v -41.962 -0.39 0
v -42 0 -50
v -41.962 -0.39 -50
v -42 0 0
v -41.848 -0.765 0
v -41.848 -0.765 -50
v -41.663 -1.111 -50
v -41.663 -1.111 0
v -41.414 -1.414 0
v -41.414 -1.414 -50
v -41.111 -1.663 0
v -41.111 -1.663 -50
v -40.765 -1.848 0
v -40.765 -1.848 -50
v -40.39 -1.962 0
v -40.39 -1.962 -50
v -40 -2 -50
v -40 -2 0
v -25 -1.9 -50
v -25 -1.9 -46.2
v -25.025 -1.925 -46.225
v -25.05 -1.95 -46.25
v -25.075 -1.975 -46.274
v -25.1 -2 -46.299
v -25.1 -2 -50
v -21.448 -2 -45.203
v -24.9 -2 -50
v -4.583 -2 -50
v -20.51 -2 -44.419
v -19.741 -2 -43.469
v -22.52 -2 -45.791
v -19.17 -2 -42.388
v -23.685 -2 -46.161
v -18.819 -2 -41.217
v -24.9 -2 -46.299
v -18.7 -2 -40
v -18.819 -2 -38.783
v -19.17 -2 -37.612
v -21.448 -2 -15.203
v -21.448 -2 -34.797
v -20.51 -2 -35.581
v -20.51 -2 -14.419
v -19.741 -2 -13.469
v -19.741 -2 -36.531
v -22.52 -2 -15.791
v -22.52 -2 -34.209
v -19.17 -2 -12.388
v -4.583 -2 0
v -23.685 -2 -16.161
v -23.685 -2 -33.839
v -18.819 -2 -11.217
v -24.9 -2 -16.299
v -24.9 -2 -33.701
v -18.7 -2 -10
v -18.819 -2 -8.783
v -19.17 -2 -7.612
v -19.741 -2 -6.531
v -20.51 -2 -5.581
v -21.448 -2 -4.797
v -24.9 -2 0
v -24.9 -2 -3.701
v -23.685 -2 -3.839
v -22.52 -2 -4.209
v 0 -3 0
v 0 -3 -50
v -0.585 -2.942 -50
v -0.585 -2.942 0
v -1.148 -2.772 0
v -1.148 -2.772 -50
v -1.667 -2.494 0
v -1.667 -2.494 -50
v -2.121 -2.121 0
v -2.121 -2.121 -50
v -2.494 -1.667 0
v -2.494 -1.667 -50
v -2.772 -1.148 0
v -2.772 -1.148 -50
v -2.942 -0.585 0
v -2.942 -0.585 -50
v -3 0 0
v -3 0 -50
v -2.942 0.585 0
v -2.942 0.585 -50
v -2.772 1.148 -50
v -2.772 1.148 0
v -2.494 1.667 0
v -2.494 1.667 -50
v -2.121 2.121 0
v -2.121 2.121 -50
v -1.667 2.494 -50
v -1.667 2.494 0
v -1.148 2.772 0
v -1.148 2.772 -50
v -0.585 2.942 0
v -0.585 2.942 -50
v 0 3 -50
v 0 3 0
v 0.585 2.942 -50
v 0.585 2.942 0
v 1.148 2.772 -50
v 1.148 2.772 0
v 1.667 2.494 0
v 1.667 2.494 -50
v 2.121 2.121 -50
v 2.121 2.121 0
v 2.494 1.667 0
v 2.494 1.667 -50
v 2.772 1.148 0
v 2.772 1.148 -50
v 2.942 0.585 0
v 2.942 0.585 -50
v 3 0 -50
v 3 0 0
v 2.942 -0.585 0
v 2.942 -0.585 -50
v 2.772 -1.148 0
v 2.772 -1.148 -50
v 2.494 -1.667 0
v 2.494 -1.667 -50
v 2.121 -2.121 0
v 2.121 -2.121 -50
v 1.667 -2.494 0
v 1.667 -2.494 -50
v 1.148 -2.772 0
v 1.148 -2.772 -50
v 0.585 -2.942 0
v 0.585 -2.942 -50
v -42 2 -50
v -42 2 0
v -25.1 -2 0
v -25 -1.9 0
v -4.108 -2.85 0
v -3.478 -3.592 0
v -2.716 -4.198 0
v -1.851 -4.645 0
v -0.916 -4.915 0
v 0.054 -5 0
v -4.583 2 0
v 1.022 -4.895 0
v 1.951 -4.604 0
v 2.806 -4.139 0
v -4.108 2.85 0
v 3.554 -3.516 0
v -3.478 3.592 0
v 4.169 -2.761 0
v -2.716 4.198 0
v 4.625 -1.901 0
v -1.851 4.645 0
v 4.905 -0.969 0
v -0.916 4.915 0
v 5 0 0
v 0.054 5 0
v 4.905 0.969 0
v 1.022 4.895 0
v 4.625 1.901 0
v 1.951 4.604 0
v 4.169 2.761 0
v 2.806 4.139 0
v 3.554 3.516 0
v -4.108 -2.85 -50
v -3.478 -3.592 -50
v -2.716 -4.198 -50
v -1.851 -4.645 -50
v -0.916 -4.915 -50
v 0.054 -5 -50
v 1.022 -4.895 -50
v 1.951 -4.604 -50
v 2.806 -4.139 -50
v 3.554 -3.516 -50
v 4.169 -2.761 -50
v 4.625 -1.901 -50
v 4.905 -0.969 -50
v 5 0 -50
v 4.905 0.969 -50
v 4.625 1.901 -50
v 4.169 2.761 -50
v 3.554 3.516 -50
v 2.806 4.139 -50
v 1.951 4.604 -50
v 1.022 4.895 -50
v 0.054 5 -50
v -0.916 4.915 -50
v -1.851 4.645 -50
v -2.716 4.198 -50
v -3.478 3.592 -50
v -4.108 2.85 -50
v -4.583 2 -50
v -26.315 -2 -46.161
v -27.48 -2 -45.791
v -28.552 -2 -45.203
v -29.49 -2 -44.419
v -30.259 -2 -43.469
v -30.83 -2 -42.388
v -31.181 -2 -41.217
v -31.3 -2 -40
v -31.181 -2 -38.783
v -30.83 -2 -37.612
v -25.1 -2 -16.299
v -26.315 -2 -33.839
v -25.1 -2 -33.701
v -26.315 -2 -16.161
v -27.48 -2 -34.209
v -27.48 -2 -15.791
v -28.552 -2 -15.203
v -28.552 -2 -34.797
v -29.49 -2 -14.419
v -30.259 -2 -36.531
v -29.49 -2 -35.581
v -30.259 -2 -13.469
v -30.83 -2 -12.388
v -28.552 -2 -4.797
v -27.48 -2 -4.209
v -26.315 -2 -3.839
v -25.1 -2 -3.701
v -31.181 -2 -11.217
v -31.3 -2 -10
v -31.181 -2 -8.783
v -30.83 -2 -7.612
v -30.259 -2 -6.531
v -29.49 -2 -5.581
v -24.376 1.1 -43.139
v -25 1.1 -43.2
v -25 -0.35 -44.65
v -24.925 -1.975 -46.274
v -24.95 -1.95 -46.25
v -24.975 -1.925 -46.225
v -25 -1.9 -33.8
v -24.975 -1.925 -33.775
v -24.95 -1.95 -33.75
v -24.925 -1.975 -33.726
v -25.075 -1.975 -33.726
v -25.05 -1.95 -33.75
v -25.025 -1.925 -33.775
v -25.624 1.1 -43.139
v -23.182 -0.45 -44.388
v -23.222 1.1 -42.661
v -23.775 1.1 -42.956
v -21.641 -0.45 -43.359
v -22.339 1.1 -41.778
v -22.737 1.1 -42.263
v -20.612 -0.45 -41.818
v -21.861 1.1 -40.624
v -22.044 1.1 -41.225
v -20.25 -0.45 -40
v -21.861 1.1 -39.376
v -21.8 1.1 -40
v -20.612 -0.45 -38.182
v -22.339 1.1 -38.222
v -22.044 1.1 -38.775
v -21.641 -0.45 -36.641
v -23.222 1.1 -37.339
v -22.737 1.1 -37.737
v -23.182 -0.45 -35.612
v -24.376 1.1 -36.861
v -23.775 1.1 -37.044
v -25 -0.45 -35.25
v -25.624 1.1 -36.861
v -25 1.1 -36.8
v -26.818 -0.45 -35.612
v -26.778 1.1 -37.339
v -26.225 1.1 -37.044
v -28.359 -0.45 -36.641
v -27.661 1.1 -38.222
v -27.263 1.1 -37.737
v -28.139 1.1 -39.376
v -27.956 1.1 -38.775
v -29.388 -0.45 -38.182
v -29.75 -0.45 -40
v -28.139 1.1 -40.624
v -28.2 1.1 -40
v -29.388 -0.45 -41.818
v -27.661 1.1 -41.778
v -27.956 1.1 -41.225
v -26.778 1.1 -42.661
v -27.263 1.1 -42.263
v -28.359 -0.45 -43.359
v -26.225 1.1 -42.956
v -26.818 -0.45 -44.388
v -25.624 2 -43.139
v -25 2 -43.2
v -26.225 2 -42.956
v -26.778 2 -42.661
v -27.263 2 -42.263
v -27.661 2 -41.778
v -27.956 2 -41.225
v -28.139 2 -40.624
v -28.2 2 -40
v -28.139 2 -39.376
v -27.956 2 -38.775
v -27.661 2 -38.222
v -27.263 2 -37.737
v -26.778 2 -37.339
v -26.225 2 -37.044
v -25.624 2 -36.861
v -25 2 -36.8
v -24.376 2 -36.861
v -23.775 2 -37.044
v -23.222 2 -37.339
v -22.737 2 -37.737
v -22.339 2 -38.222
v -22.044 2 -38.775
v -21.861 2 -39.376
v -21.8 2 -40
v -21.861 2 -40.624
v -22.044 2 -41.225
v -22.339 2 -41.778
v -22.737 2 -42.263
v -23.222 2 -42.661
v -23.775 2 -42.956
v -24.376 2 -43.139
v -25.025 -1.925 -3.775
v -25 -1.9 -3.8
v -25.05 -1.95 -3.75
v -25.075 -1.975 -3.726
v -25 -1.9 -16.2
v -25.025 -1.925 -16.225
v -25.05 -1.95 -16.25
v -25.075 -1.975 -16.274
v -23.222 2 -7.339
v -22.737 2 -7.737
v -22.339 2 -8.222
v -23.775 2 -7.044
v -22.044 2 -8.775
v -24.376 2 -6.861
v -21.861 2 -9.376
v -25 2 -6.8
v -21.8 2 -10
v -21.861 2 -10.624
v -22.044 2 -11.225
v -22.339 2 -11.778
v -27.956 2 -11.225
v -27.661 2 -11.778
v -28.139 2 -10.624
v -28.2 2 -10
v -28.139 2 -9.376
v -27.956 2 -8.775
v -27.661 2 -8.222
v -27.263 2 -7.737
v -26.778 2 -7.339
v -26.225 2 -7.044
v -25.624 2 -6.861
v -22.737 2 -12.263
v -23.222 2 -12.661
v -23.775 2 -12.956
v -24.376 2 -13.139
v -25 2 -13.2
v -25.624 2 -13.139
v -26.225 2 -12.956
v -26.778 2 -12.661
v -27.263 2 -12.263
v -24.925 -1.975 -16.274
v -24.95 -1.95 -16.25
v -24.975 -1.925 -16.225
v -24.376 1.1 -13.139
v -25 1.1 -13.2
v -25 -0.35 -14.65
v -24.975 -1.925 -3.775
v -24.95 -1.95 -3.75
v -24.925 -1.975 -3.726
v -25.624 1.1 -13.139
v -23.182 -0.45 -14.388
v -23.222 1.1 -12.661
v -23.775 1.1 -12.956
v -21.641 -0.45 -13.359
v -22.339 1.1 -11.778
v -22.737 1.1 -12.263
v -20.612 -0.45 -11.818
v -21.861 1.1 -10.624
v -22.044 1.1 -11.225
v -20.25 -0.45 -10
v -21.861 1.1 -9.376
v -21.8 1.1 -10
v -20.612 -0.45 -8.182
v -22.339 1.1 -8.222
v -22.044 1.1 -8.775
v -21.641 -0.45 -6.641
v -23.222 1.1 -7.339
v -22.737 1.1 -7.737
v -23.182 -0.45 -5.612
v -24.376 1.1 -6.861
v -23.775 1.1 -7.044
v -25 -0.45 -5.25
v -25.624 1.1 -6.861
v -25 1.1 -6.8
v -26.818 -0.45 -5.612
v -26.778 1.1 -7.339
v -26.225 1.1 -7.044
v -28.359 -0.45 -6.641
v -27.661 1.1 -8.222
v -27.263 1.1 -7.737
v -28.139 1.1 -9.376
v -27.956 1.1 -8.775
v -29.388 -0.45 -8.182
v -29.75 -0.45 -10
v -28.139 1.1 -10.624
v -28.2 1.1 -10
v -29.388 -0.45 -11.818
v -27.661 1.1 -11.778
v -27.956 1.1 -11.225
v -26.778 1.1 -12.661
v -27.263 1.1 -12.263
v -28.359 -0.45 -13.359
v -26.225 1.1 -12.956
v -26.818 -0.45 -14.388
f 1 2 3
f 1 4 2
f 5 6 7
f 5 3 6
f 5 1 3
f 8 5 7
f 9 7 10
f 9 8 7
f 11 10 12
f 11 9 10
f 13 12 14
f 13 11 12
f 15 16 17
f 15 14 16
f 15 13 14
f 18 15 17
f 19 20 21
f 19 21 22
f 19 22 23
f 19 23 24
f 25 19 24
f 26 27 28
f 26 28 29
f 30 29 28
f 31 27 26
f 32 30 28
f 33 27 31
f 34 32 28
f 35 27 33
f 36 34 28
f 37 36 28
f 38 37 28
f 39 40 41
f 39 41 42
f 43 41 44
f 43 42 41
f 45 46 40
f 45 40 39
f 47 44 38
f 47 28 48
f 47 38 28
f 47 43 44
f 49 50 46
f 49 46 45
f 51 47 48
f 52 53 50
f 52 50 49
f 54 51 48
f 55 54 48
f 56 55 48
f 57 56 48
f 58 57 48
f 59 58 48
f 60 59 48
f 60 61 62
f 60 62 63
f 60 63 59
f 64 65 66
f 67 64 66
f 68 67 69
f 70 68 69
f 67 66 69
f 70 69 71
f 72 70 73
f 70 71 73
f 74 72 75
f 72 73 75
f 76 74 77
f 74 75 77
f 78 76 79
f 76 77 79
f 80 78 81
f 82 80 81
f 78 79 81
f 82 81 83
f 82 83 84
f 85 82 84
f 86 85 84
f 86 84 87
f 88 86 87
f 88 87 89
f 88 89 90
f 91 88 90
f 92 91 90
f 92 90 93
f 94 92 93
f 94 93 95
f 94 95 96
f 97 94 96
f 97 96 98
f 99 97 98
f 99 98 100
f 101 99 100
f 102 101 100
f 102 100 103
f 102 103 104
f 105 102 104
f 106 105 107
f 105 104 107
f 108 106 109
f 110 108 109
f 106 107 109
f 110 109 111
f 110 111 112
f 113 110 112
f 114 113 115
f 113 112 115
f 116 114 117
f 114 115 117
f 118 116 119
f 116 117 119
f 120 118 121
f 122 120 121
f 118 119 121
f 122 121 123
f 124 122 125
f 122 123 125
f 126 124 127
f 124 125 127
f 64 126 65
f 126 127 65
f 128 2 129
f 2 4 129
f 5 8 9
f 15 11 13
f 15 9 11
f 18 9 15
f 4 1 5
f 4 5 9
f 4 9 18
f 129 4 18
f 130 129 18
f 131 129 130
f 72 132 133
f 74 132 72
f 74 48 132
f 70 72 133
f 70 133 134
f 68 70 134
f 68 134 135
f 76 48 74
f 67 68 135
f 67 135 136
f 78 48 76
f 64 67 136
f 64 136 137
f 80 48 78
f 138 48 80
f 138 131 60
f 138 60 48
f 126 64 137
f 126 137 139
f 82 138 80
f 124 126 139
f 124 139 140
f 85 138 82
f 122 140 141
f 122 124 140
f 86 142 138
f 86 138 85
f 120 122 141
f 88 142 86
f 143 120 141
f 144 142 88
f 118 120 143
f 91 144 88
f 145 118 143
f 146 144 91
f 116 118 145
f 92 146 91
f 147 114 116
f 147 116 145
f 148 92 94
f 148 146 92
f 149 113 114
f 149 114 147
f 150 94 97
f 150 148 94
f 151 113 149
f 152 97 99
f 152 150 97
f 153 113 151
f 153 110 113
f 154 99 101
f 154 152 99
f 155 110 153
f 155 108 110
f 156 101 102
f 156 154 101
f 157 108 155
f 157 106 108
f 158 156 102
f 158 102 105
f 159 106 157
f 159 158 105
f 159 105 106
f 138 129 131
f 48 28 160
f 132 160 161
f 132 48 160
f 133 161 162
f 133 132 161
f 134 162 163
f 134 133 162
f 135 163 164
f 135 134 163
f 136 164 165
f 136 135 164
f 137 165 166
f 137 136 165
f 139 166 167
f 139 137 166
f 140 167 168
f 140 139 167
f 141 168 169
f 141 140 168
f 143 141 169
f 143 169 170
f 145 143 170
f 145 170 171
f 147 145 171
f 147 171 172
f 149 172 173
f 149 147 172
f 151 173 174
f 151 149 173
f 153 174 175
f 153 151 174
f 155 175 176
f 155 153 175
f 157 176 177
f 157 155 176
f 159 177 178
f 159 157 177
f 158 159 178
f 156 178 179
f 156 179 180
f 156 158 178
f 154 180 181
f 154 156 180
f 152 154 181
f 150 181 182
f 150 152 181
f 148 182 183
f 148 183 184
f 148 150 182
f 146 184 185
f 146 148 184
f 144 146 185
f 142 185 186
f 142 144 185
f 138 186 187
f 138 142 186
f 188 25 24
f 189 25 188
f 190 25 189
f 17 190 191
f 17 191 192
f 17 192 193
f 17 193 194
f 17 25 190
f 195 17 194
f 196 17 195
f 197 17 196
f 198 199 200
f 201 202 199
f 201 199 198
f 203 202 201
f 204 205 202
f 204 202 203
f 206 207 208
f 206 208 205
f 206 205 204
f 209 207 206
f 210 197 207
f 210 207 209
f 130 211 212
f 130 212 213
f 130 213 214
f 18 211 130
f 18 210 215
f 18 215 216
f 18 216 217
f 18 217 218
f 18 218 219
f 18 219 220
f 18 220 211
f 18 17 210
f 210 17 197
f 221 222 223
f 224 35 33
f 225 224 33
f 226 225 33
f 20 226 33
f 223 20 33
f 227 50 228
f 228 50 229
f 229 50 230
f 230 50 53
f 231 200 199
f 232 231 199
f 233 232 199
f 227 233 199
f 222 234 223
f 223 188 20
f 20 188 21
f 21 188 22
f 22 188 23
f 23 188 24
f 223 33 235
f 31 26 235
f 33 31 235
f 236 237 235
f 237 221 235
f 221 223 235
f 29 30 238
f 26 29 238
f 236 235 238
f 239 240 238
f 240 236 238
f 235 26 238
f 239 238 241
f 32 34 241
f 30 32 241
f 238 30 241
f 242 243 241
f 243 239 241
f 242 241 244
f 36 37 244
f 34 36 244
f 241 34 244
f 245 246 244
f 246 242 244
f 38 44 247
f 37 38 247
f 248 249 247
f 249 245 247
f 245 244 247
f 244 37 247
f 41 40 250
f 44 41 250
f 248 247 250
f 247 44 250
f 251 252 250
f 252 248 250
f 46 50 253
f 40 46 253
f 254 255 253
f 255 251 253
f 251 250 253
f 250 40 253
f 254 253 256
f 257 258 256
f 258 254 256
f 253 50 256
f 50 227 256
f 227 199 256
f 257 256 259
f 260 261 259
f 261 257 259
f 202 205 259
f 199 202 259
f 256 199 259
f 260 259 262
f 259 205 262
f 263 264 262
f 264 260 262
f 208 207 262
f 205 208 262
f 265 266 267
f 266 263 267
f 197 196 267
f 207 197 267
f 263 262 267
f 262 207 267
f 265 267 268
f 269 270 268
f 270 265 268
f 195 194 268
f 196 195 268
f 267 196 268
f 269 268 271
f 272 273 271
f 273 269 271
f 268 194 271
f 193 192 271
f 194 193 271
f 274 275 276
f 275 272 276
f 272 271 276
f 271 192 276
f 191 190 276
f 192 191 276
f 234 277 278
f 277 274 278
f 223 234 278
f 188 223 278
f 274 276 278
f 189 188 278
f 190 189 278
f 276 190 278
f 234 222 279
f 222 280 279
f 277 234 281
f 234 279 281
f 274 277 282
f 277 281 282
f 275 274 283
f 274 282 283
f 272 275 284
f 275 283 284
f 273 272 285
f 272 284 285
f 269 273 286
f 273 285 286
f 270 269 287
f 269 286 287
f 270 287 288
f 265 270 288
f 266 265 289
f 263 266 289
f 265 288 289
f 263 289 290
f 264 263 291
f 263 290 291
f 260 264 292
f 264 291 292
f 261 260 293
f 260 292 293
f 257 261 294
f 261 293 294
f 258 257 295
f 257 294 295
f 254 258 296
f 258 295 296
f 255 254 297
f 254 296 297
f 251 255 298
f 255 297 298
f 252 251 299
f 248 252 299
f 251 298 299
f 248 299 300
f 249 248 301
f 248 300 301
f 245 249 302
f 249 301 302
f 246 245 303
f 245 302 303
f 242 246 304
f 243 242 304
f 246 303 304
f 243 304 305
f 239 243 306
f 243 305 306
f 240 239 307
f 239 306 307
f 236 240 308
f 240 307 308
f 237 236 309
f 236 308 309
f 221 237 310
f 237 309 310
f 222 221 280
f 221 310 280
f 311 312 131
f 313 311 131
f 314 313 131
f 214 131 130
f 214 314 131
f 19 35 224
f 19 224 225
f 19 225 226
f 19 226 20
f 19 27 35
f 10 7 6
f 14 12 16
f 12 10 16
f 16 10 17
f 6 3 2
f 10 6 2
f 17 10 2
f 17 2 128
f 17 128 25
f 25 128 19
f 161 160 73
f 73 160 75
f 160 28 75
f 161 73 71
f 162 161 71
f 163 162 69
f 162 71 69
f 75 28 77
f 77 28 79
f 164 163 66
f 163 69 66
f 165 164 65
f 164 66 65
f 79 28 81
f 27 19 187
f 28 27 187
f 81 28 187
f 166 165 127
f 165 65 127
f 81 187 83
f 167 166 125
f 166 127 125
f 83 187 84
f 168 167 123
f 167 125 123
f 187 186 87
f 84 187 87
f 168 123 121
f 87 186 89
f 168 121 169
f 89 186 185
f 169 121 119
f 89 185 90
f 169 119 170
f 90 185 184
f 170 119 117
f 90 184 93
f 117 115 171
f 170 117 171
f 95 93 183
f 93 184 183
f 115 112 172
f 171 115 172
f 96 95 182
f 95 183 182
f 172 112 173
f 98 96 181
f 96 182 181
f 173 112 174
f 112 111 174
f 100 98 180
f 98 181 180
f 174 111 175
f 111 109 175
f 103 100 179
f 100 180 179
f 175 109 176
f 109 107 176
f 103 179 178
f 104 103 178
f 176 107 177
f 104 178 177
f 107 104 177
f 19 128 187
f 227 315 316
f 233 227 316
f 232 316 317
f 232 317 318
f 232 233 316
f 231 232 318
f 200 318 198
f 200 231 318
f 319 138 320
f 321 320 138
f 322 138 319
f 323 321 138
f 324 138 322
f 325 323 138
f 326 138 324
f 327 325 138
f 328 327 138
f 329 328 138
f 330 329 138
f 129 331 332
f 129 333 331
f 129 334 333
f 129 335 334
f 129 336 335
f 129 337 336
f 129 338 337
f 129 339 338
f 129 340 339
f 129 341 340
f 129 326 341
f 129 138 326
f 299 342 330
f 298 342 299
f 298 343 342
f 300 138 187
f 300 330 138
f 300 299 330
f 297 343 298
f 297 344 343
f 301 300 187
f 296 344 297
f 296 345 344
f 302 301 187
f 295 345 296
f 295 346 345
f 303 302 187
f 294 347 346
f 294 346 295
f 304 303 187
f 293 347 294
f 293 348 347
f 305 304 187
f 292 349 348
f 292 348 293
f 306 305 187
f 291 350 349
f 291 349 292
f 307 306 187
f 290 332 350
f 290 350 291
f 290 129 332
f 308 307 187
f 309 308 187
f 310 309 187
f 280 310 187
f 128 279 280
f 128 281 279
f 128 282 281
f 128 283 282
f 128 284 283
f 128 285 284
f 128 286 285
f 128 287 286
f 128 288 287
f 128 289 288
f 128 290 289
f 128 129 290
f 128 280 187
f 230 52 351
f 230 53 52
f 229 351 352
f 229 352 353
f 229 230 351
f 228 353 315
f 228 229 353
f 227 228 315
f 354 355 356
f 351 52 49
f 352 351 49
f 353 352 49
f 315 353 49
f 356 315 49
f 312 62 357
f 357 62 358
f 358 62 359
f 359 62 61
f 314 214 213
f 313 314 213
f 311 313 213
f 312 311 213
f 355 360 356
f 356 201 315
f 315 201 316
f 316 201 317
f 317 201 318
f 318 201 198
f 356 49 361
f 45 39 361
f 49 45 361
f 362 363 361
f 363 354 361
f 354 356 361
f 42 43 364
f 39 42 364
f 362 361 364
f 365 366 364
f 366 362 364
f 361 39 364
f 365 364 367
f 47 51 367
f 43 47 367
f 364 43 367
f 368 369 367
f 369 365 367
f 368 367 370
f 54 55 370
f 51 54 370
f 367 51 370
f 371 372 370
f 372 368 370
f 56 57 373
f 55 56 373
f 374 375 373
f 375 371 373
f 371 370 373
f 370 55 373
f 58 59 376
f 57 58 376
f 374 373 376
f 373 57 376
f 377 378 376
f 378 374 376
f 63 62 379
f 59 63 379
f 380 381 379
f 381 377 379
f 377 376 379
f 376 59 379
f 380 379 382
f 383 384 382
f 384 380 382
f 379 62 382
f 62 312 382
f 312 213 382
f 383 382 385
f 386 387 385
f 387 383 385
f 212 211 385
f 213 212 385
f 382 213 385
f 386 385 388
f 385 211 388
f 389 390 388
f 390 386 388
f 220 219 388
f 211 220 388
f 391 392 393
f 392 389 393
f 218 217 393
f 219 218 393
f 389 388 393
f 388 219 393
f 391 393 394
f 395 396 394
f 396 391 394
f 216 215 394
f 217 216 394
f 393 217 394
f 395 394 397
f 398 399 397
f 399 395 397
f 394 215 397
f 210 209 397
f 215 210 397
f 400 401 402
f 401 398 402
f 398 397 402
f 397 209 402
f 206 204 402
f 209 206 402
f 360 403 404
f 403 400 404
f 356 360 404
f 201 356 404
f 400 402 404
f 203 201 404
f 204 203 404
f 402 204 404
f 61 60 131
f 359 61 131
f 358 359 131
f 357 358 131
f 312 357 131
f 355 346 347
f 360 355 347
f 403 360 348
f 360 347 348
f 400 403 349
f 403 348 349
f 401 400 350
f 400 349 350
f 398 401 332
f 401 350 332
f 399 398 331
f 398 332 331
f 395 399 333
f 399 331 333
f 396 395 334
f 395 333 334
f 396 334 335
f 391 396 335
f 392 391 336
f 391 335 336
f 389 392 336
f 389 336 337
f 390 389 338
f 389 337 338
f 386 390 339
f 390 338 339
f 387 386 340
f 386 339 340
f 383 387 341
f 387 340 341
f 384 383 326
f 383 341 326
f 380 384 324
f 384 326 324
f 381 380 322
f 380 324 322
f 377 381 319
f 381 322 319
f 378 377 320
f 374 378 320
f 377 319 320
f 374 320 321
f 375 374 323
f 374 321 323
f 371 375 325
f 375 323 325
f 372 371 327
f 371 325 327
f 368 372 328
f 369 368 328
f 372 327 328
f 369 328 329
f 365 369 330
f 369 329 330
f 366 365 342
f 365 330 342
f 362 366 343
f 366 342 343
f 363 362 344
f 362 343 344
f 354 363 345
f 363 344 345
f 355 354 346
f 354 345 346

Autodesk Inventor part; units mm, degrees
ref_plane "XZ Plane" through (0, 0, 0) normal (0, 1, 0) x (-1, 0, 0)
sketch "Sketch1" plane through (0, 0, 0) normal (0, 0, 1) x (1, 0, 0)
  circle A0 centre (0, 0) radius 5
  dimension "d0" = 10
extrude "Extrusion1" add sketch "Sketch1" against normal blind 50
ref_plane "Work Plane1" through (-42, 0, 0) normal (1, 0, 0) x (0, 1, 0)
sketch "Sketch2" plane through (-42, 0, 0) normal (1, 0, 0) x (0, 1, 0)
  line L0 (5, -50) -> (-5, -50) projected
  line L1 (-5, 0) -> (5, 0) projected
  line L2 (0, -60) -> (0, 10) projected
  line L3 (-2, 0) -> (2, 0)
  line L4 (2, 0) -> (2, -50)
  line L5 (2, -50) -> (-2, -50)
  line L6 (-2, -50) -> (-2, 0)
  dimension "d4" = 4
  dimension "d5" = 2
extrude "Extrusion2" add sketch "Sketch2" along normal blind 42
sketch "Sketch3" plane through (0, 0, 0) normal (0, 0, 1) x (1, 0, 0)
  arc A0 (-4.5826, -2) -> (-4.5826, 2) centre (0, 0) ccw projected
hole "Hole1" at (0, 0, 0) direction (0, 0, -1) diameter 6 end through all
ref_plane "Work Plane2" through (-25, 0, 0) normal (1, 0, 0) x (0, 1, 0)
sketch "Sketch4" plane through (-42, -2, -50) normal (0, -1, 0) x (1, 0, 0)
  line L0 (0, 0) -> (37.4174, 0) projected
  line L1 (17, 60) -> (17, -10) projected
  point P0 (17, 40)
  point P1 (17, 10)
  dimension "d16" = 30
  dimension "d17" = 10
hole "Hole2" at (-25, -2, -10) at (-25, -2, -40) direction (0, 1, 0) diameter 6.4 end through all countersink diameter 12.6 countersink angle 90 clearance for "Flat Head Machine Screw" size "M6" standard "Ansi Metric M Profile"
sketch "Sketch5" plane through (0, 0, -50) normal (0, 0, -1) x (-1, 0, 0)
  line L0 (42, -2) -> (4.5826, -2) projected
  line L1 (25, -7) -> (25, 7) projected
  line L2 (24.9, -2) -> (25, -1.9)
  line L3 (25, -1.9) -> (25.1, -2)
  dimension "d25" = 90
  dimension "d26" = 45
  dimension "d27" = 0.1
extrude "Extrusion3" cut sketch "Sketch5" against normal through all
fillet "Fillet1" radius 2 1 edges at (-42, -2, -25)
equation "\"d5\" = 0.5 * d4"
equation "\"d26\" = 0.5 * d25"
properties part number "23-225Z1" material "Aluminum-6061"
